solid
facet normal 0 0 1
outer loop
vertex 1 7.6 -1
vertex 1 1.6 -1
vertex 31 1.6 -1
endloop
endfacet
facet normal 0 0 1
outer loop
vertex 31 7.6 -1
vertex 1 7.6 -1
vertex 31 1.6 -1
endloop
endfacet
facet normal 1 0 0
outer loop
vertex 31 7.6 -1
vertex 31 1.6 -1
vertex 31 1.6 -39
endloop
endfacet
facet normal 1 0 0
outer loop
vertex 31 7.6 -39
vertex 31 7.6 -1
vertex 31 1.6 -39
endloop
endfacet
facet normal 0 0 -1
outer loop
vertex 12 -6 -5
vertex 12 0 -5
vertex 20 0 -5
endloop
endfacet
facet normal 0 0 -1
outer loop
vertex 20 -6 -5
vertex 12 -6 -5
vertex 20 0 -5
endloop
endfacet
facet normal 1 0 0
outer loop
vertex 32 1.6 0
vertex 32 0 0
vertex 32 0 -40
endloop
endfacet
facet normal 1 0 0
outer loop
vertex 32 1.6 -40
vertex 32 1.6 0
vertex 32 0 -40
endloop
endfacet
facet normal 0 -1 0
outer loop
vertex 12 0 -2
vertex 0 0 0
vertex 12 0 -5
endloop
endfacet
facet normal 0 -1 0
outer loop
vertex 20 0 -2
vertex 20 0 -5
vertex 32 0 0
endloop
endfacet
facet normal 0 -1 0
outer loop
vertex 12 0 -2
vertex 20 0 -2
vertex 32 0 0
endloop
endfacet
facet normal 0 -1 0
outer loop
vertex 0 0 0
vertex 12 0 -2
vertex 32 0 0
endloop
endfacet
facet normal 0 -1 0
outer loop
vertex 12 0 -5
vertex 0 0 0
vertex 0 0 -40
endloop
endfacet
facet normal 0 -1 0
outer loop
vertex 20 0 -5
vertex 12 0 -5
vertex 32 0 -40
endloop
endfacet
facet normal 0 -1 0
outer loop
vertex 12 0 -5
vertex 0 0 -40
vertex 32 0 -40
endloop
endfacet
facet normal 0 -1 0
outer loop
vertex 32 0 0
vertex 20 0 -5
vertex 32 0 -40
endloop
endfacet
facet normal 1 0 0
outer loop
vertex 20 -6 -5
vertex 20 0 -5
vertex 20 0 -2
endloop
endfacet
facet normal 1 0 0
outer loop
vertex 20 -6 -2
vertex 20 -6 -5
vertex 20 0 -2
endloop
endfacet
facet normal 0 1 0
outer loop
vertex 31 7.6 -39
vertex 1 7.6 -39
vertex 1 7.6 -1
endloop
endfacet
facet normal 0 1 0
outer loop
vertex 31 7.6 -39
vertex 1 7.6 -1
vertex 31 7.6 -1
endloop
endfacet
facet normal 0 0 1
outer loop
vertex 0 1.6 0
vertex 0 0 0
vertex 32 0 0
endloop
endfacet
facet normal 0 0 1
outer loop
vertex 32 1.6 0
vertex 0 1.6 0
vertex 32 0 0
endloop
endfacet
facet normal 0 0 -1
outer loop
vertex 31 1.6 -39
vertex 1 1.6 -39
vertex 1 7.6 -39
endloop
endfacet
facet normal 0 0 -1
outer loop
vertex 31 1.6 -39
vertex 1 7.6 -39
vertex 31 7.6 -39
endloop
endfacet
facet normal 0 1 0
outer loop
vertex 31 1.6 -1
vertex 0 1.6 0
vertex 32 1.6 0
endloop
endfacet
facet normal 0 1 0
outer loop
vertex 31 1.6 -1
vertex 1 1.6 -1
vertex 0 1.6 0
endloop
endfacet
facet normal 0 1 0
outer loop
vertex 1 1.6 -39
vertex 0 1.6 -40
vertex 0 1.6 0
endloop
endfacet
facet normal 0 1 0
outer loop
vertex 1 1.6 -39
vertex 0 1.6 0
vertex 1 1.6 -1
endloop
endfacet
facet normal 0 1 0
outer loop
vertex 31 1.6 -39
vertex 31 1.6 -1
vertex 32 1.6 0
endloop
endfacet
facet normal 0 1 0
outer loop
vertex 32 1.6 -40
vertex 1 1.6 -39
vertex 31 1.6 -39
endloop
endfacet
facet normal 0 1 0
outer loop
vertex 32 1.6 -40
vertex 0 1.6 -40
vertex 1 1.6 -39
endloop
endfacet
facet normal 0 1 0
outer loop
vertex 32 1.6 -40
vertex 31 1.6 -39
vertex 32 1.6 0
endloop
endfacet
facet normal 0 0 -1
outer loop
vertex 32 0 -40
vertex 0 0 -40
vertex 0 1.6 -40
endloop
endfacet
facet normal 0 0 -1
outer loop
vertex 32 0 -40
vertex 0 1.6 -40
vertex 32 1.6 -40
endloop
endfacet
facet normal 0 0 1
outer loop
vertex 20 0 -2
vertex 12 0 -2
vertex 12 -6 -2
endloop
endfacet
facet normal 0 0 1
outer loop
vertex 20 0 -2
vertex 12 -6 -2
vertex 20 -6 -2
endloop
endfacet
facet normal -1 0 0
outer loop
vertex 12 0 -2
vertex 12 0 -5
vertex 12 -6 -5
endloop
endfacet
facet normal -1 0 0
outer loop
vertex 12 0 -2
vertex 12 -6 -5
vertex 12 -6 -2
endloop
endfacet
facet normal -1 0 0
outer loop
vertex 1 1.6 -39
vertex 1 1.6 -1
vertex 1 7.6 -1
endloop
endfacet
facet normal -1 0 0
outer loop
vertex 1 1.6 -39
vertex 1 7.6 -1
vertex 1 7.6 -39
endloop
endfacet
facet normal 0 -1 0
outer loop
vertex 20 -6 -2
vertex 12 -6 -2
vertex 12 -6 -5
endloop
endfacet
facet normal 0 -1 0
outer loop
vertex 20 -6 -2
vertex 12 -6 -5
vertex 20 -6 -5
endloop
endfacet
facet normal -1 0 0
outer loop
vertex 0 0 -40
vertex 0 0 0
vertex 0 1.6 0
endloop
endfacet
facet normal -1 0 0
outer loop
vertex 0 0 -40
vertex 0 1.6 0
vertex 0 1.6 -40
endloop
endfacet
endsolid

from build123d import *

# Parameters (mm, degrees)
SKETCH1_W           = 32
SKETCH1_H           = 40
BOSS_EXTRUDE1_DEPTH = 1.6
SKETCH2_W           = 30
SKETCH2_H           = 38
BOSS_EXTRUDE2_DEPTH = 6
SKETCH3_W           = 8
SKETCH3_H           = 3
BOSS_EXTRUDE3_DEPTH = 6


with BuildPart() as part:
    # Sketch1 → Boss-Extrude1 (new body)
    with BuildSketch(Plane(origin=(0, 0, 0), x_dir=(1, 0, 0), z_dir=(0, 1, 0))):
        with Locations((16, 20)):
            Rectangle(SKETCH1_W, SKETCH1_H)
    extrude(amount=BOSS_EXTRUDE1_DEPTH)

    # Sketch2 → Boss-Extrude2 (add)
    with BuildSketch(Plane(origin=(0, 1.6, 0), x_dir=(1, 0, 0), z_dir=(0, 1, 0))):
        with Locations((16, 20)):
            Rectangle(SKETCH2_W, SKETCH2_H)
    extrude(amount=BOSS_EXTRUDE2_DEPTH)

    # Sketch3 → Boss-Extrude3 (add)
    with BuildSketch(Plane.XZ):
        with Locations((16, -3.5)):
            Rectangle(SKETCH3_W, SKETCH3_H)
    extrude(amount=BOSS_EXTRUDE3_DEPTH)


solid = part.part
